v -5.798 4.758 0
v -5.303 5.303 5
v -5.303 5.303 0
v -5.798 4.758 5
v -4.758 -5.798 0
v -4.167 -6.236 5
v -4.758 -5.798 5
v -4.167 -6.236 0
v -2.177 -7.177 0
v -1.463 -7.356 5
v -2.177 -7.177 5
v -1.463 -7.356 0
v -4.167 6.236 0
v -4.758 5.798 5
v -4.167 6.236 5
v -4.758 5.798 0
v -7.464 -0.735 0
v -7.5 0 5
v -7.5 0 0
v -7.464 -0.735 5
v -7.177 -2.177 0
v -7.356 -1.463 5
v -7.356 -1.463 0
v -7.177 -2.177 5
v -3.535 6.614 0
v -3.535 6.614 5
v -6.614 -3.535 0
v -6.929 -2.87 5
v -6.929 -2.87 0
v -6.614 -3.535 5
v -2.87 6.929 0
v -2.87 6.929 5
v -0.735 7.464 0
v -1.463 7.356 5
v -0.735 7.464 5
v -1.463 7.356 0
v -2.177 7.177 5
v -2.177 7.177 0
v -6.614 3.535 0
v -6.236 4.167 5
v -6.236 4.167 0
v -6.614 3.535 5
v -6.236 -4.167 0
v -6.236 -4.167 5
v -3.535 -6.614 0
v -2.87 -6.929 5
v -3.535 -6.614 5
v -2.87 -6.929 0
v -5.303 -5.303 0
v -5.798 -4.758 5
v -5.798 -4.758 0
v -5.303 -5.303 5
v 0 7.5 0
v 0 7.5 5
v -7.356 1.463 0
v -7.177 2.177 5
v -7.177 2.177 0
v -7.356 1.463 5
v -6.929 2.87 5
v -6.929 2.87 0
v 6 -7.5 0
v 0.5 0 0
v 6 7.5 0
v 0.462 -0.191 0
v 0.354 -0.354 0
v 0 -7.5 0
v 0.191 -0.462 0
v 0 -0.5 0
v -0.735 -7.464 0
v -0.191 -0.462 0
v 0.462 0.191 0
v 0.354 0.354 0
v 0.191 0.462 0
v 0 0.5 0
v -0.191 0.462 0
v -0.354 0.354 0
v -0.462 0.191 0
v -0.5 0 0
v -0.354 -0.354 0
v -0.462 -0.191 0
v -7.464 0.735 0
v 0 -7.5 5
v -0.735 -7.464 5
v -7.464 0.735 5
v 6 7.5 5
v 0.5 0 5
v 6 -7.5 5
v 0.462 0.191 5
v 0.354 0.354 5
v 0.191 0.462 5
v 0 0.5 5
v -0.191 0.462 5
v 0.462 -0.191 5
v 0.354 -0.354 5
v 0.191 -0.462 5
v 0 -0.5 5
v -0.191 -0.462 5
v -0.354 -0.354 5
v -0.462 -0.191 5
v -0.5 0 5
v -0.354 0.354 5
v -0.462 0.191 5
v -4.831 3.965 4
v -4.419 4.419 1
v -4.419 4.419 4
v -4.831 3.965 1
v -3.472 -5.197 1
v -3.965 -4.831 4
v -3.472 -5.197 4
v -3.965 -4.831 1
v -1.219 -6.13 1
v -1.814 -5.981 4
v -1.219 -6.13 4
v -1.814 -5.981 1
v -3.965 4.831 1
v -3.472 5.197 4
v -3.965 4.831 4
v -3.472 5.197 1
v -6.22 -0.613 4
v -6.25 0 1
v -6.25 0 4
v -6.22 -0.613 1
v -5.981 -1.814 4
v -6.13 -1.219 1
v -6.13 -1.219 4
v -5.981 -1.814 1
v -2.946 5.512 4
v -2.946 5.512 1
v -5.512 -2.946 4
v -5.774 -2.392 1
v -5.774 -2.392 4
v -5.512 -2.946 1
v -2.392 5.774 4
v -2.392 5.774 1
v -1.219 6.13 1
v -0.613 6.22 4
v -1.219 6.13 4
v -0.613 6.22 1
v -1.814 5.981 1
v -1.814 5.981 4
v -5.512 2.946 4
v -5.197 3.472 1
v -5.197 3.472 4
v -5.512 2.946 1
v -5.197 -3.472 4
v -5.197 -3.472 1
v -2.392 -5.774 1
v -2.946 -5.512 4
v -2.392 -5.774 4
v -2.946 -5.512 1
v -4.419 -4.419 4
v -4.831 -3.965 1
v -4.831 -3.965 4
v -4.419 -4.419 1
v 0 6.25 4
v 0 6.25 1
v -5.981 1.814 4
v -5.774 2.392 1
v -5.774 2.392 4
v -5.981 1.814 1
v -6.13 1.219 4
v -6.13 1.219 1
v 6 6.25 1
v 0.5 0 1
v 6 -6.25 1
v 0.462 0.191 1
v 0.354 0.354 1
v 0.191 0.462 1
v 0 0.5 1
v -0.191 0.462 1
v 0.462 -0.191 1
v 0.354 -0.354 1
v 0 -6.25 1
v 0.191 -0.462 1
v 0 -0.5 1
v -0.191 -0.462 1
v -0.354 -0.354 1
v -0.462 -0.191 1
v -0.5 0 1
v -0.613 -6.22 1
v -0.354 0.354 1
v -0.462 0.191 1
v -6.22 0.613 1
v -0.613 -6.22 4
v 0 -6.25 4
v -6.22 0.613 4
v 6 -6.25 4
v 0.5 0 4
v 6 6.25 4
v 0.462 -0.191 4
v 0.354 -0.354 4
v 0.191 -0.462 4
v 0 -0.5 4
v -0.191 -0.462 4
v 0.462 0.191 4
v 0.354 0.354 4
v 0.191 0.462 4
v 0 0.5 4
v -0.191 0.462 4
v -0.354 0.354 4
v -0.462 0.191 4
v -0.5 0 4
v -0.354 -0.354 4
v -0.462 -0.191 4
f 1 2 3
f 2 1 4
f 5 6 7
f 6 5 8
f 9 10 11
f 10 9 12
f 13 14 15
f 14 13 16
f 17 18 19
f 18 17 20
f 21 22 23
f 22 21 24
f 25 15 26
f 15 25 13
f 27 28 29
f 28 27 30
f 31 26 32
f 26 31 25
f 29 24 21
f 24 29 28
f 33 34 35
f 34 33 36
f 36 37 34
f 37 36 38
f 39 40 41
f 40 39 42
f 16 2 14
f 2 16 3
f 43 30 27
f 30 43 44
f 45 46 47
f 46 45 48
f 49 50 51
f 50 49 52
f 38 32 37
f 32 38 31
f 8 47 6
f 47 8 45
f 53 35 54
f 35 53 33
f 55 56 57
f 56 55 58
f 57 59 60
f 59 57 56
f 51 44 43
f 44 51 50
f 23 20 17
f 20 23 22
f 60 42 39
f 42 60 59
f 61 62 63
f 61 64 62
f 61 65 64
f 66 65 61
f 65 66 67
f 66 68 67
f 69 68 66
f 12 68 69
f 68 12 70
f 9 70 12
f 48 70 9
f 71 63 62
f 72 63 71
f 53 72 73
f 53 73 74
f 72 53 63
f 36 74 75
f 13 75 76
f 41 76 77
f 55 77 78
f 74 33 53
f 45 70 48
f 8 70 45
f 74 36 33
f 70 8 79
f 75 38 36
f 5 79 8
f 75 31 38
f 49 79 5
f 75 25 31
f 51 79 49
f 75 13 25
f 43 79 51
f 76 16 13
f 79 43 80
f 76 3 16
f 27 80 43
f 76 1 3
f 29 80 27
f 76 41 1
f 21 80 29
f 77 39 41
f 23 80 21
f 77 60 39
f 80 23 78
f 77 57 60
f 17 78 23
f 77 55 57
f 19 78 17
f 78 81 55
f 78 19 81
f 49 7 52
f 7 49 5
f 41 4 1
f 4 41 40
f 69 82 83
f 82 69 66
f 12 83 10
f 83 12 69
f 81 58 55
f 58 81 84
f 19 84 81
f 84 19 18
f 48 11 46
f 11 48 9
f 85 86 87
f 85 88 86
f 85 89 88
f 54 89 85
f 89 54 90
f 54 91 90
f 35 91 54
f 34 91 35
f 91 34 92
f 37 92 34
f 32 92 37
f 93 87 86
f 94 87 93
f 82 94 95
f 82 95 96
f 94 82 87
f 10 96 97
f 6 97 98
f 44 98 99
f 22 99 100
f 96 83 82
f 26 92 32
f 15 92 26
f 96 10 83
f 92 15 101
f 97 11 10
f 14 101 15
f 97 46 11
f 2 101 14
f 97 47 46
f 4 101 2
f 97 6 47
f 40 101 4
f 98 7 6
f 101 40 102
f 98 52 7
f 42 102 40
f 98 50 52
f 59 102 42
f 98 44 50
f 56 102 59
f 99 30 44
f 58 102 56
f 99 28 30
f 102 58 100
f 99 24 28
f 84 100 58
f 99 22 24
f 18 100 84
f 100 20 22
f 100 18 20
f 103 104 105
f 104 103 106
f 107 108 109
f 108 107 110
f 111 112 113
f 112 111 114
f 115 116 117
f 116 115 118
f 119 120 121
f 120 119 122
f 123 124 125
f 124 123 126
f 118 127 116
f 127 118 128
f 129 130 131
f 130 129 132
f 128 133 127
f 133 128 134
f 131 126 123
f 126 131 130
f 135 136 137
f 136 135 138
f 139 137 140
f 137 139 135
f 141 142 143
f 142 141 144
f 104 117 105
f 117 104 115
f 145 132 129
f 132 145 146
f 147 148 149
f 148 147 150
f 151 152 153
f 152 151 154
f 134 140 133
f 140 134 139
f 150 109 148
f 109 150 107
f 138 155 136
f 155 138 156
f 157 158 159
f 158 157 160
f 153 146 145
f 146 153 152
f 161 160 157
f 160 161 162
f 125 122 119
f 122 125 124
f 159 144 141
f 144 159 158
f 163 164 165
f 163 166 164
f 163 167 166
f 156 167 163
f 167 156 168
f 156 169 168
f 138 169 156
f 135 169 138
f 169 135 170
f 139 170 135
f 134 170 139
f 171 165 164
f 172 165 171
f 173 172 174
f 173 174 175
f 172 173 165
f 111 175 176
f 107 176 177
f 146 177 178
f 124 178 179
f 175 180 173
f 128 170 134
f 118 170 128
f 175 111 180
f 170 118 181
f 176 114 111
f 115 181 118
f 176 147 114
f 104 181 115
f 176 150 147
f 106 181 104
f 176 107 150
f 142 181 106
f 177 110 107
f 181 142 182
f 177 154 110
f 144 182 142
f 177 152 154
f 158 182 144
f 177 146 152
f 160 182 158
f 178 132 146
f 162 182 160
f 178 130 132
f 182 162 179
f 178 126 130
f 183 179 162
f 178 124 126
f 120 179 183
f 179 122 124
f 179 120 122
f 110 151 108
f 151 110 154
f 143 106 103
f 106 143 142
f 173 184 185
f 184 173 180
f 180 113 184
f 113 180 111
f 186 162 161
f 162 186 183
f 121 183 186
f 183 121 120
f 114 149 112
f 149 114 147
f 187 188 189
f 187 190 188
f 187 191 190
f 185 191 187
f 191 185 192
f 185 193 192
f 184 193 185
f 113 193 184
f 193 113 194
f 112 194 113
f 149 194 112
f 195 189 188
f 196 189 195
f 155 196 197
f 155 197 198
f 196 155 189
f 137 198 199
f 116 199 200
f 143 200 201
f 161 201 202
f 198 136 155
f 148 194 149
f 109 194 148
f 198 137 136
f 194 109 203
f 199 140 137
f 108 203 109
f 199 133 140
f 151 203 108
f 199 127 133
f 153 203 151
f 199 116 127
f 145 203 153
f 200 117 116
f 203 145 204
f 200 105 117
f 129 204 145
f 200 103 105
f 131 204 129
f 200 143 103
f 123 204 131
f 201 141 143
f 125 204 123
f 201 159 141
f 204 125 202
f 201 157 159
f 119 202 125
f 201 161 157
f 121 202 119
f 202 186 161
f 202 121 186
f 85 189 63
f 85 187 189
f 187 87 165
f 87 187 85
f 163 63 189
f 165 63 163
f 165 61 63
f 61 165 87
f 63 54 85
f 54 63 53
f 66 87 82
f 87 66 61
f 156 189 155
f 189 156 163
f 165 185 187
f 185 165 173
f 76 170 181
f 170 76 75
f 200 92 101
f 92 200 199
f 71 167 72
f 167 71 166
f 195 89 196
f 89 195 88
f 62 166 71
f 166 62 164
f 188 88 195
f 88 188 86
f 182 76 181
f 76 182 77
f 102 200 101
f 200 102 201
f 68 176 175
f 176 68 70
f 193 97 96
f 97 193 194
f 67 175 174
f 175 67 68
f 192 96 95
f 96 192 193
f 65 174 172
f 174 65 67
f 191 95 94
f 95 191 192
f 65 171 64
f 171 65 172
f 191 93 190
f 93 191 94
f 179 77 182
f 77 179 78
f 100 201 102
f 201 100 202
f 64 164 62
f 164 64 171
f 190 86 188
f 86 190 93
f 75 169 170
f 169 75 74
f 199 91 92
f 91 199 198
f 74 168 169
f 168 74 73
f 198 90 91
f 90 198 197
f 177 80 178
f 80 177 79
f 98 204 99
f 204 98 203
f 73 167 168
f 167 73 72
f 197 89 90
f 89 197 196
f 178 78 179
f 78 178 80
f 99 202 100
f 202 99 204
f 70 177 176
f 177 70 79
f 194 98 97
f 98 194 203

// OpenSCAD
//Battery dimensions in mm

battery_diameter=12;
battery_height=2.5;
tolerance=0.5;
wall_thickness=1;
difference()
{
	union()
	{
		difference()
		{
			cylinder(r=(battery_diameter/2)+tolerance+wall_thickness, h=battery_height+(tolerance)+(2*wall_thickness),$fn=64);

			translate([0,0,wall_thickness])
			cylinder(r=(battery_diameter/2)+(tolerance/2), h=battery_height+(tolerance),$fn=64);
			translate([0,-((battery_diameter/2)+2+tolerance),0])
			cube([battery_diameter+10,battery_diameter+5,battery_height+5]);

		}

		difference()
		{
			translate([0,-((battery_diameter/2)+wall_thickness+tolerance),0])
			cube([battery_diameter/2,battery_diameter+(2*wall_thickness)+(2*tolerance),battery_height+(2*wall_thickness)+tolerance]);

			translate([0,-((battery_diameter/2))-(tolerance/2),wall_thickness])
			cube([battery_diameter+tolerance,battery_diameter+tolerance,battery_height+tolerance]);
		}
	}
	translate([0,0,-1])
	cylinder(r=0.5, h=battery_height+tolerance+10,$fn=16);
}
